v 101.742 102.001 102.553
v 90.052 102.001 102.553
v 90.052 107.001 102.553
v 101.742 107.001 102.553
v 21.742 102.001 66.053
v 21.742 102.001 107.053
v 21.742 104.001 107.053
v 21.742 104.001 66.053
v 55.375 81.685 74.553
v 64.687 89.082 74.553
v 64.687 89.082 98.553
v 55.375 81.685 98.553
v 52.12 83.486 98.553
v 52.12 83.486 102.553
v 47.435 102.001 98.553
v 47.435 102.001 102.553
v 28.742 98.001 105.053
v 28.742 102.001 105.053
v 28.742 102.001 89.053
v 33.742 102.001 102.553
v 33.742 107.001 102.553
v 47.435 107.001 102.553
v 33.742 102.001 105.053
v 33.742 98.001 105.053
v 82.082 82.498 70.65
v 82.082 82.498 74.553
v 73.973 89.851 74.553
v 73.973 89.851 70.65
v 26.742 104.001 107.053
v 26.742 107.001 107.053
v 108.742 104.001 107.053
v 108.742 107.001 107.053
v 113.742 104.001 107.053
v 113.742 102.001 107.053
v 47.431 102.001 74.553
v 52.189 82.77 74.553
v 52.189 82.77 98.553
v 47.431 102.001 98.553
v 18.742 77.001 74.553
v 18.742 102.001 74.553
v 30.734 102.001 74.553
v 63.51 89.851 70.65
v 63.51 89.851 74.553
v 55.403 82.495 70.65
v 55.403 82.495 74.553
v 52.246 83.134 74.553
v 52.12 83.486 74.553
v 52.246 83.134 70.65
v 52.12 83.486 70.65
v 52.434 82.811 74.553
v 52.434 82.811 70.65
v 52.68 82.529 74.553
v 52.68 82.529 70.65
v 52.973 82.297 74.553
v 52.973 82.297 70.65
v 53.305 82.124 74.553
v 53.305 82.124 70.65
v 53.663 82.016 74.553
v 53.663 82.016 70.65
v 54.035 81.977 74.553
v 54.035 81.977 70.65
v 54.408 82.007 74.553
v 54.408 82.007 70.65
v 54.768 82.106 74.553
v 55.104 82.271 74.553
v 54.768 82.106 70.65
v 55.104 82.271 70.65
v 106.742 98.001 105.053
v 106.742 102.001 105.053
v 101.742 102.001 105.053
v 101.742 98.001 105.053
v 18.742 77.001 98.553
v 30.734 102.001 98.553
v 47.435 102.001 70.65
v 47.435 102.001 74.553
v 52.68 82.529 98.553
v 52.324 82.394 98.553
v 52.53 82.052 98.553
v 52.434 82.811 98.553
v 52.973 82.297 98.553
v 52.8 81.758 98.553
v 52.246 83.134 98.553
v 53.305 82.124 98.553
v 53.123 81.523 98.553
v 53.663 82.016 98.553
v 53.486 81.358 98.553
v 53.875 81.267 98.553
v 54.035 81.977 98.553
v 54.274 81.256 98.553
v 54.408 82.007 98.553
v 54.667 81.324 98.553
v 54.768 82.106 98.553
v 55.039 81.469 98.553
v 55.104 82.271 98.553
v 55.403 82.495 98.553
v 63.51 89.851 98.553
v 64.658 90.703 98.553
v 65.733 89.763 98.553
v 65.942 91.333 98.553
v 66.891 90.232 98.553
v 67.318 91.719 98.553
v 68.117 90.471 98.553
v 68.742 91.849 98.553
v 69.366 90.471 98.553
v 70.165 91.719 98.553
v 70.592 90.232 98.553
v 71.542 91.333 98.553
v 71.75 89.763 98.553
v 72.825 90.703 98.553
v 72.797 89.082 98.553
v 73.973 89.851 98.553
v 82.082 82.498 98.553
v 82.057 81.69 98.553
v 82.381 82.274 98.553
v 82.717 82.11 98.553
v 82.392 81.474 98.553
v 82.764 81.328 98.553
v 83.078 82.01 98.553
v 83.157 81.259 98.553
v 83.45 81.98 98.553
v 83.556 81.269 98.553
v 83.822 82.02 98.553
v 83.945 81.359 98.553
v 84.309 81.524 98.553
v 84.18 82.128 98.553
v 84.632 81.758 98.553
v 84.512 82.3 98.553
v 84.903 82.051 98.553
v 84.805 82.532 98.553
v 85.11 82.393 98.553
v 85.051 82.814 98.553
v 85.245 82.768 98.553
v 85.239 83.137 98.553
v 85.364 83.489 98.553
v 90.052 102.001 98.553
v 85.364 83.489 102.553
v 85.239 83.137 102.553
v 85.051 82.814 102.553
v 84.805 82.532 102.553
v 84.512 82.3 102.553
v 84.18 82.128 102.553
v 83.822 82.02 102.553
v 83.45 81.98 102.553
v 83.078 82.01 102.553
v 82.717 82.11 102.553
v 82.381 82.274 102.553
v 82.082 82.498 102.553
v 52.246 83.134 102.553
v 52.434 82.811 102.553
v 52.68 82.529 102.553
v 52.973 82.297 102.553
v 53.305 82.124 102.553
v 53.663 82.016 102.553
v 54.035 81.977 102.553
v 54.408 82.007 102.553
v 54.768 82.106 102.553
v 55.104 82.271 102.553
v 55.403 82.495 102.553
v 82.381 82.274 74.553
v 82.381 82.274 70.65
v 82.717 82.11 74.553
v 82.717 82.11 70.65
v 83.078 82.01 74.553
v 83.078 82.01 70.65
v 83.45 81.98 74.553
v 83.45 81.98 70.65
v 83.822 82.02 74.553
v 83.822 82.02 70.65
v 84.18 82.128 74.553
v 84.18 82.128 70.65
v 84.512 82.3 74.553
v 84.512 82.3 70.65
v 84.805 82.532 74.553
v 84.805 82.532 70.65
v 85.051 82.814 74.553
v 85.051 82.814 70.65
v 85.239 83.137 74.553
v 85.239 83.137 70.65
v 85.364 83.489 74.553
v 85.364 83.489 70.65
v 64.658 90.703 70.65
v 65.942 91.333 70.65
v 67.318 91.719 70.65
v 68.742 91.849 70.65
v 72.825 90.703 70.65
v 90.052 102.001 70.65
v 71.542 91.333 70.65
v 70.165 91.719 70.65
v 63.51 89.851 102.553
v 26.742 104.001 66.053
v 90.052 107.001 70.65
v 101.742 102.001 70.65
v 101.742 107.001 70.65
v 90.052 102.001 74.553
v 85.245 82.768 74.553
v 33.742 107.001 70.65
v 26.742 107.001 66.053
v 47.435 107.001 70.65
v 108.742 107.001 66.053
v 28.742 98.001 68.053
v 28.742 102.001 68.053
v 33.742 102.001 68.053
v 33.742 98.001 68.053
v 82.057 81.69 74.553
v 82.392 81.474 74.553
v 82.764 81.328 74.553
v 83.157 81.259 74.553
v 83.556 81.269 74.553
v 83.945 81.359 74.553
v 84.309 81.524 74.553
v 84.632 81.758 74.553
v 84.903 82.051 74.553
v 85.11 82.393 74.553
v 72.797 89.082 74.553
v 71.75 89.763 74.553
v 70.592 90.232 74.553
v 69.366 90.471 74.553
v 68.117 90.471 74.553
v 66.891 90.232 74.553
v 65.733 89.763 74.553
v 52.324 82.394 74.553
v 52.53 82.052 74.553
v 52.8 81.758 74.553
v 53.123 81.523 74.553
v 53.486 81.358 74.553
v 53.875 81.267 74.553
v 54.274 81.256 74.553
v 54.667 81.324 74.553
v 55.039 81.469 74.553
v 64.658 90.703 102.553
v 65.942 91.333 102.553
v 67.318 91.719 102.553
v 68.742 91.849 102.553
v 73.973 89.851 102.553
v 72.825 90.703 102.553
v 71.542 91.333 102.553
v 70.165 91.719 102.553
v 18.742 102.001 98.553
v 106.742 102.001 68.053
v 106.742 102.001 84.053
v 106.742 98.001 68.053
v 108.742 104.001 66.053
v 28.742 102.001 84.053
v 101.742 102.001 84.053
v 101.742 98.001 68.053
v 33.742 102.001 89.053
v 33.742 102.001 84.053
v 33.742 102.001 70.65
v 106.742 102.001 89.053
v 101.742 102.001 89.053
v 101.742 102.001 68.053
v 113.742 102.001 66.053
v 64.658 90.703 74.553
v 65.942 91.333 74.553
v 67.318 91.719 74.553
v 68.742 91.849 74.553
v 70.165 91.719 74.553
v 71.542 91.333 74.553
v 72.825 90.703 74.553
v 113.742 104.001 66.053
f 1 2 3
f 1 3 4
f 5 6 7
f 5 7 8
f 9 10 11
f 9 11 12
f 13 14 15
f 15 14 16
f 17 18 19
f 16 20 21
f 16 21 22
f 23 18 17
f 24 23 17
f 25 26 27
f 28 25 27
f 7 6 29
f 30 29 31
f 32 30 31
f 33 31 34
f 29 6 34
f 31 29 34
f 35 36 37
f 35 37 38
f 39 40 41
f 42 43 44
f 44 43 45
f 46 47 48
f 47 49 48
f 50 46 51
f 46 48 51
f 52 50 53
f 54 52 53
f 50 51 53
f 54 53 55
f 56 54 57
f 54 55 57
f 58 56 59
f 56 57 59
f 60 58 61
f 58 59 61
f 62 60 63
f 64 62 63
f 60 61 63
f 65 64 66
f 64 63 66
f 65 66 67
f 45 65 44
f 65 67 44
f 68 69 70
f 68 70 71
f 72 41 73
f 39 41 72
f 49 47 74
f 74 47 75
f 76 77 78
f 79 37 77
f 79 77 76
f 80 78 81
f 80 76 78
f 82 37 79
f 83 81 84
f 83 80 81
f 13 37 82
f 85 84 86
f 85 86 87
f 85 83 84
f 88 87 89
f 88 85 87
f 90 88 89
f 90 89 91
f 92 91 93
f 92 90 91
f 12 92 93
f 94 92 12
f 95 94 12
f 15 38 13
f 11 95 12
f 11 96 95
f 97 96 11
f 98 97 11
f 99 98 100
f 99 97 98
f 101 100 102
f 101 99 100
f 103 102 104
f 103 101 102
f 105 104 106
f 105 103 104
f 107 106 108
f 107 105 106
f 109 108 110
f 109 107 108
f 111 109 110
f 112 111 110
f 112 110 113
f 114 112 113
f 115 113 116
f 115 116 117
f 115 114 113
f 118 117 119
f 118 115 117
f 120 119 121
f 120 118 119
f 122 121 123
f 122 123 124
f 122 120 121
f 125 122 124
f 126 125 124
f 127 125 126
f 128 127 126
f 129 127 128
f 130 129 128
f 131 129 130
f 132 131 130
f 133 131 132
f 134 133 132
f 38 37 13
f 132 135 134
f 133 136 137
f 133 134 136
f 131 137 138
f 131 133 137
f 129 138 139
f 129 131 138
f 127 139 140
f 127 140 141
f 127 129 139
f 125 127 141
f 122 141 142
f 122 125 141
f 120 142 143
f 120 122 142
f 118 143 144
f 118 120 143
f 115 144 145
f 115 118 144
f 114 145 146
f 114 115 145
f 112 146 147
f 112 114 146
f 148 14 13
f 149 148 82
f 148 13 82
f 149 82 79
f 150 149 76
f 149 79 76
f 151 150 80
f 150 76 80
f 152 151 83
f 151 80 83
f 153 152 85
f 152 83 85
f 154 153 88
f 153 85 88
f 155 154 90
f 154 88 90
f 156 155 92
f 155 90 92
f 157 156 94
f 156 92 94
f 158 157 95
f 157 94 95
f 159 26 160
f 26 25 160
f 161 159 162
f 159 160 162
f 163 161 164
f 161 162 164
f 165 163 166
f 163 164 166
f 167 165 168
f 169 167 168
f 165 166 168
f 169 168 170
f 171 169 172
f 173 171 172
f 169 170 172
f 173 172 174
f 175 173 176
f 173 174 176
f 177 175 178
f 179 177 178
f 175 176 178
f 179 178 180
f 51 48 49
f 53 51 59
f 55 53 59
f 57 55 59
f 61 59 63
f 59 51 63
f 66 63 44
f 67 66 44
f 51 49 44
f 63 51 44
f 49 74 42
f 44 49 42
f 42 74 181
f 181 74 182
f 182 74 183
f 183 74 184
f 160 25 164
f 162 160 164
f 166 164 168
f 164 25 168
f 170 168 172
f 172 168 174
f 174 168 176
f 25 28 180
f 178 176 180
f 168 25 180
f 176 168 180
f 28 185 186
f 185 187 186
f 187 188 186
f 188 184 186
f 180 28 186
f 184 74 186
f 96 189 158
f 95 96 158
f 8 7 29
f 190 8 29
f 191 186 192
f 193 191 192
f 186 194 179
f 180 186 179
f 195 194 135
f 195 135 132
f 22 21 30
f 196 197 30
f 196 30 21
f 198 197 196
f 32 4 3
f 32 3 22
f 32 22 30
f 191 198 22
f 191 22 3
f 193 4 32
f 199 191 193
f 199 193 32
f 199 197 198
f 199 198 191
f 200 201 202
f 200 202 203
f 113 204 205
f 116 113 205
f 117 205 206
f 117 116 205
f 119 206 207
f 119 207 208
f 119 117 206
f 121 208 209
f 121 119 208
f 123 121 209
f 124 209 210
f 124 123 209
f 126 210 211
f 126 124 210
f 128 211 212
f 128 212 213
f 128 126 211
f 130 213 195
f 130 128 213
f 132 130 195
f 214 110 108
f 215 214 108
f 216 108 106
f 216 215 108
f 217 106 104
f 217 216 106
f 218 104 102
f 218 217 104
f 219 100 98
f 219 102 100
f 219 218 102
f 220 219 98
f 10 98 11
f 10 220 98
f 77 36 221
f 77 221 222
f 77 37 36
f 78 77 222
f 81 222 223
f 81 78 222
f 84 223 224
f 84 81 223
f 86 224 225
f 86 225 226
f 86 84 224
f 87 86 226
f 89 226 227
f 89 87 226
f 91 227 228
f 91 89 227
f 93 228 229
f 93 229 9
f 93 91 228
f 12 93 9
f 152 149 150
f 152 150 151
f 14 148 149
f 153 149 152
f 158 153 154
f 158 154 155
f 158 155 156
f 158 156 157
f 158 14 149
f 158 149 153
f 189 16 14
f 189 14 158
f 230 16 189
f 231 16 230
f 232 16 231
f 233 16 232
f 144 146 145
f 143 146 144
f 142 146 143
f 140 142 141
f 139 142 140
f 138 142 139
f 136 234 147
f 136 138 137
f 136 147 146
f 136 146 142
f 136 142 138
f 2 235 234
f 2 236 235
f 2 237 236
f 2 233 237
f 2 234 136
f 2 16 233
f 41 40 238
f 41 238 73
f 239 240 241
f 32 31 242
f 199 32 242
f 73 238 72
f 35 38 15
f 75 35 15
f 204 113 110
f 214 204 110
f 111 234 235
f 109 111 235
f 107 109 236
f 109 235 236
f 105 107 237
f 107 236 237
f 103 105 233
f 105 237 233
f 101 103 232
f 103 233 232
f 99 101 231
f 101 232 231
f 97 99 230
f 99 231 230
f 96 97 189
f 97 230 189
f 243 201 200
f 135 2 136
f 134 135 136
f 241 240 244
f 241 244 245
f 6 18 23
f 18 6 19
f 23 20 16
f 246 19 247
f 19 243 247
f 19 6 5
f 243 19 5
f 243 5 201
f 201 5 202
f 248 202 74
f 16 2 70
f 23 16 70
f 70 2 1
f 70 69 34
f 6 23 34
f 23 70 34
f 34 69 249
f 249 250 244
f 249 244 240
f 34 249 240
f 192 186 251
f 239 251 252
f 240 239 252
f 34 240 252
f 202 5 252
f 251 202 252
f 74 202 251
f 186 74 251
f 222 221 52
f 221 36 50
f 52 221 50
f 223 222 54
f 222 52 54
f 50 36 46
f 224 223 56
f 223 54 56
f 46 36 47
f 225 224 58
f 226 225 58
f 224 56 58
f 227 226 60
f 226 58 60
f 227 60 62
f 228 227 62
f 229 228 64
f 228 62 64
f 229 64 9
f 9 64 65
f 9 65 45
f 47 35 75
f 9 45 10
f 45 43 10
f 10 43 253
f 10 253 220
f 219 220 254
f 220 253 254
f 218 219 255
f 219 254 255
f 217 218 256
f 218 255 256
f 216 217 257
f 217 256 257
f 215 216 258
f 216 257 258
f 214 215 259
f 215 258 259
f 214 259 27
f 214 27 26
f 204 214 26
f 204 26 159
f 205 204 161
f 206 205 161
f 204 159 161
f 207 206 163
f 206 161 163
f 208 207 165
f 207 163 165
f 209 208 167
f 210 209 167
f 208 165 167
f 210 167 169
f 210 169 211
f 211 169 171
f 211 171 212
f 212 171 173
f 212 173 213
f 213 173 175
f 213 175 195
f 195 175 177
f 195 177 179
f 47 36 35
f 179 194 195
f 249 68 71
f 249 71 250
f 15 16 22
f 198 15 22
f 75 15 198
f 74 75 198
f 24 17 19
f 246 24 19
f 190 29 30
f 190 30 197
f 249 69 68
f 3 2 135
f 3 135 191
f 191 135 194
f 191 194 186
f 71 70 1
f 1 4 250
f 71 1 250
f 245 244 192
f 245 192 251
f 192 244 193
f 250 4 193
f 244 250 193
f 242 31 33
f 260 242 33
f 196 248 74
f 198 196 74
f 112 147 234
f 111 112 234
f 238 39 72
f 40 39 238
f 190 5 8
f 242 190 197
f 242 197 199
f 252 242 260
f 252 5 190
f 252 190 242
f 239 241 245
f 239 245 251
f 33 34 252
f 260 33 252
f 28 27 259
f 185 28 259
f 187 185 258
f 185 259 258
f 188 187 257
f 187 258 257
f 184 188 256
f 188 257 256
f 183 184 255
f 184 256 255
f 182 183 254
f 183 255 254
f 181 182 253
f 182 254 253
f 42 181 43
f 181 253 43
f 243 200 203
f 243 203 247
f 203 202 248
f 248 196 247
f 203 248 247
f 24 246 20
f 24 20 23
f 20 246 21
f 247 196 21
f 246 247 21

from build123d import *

# Parameters (mm, degrees)
SKETCH_1_W                = 95.051874556
SKETCH_1_H                = 3.903181728
EXTRUDE_1_DEPTH           = 25
SKETCH_1_H_2              = 4
EXTRUDE_1_2_DEPTH         = 25
CUT_EXTRUDE_15_DEPTH      = 32
EXTRUDE_START             = 74.552702475
EXTRUDE_5_OUTLINE_W       = 95.051874556
EXTRUDE_5_OUTLINE_H       = 25
EXTRUDE_5_DEPTH           = 24
CUT_EXTRUDE_16_DEPTH      = 158.81601617
CUT_EXTRUDE_16_DEPTH_BACK = 158.81601617
SKETCH_3_R                = 6.5
FILLET_2_R                = 2
FILLET_3_R                = 2
EXTRUDE_6_DEPTH           = 5
EXTRUDE_6_2_DEPTH         = 5
EXTRUDE_7_DEPTH           = 5
EXTRUDE_7_2_DEPTH         = 5
SKETCH_6_W                = 82
SKETCH_6_H                = 41
SKETCH_6_W_2              = 13.693142479
SKETCH_6_H_2              = 31.903181728
SKETCH_6_W_3              = 11.689861707
EXTRUDE_8_DEPTH           = 5
SKETCH_7_W                = 5
SKETCH_7_H                = 41
EXTRUDE_9_DEPTH           = 2
CUT_EXTRUDE_START         = 74.552702475
CUT_EXTRUDE_17_DEPTH      = 24


# Read off the part's stored shape, not the designer's step: Бобышка-Вытянуть5, Вырез-Вытянуть17
with BuildPart() as part:
    # Эскиз1 → Бобышка-Вытянуть1 (new body)
    with BuildSketch(Plane(origin=(0, 102.001425994, 0), x_dir=(1, 0, 0), z_dir=(0, 1, 0))):
        with Locations((66.267706326, -72.601111611)):
            Rectangle(SKETCH_1_W, SKETCH_1_H)
    extrude(amount=-EXTRUDE_1_DEPTH)


with BuildPart() as body_2:
    # Эскиз1 → Extrude 1 2 (new body)
    with BuildSketch(Plane(origin=(0, 102.001425994, 0), x_dir=(1, 0, 0), z_dir=(0, 1, 0))):
        with Locations((66.267706326, -100.552702475)):
            Rectangle(SKETCH_1_W, SKETCH_1_H_2)
    extrude(amount=-EXTRUDE_1_2_DEPTH)


with BuildPart() as cut_extrude_15_tool:
    # Эскиз2 → Вырез-Вытянуть15 (new body)
    with BuildSketch(Plane.XY.offset(102.552702475)):
        with BuildLine():
            Line((63.510266919, 89.850934142), (52.937126115, 80.258094246))
            Line((52.937126115, 80.258094246), (47.434911527, 102.001425994))
            Line((47.434911527, 102.001425994), (18.741769048, 102.001425994))
            Line((18.741769048, 102.001425994), (18.741769048, 77.001425994))
            Line((18.741769048, 77.001425994), (113.793643604, 77.001425994))
            Line((113.793643604, 77.001425994), (113.793643604, 102.001425994))
            Line((113.793643604, 102.001425994), (90.051907341, 102.001425994))
            Line((90.051907341, 102.001425994), (84.547557962, 80.262935973))
            Line((84.547557962, 80.262935973), (73.973273177, 89.850934142))
            ThreePointArc((73.973273177, 89.850934142), (68.741770048, 91.84906096), (63.510266919, 89.850934142))
        make_face()
    extrude(amount=-CUT_EXTRUDE_15_DEPTH)


with BuildPart() as part_1:
    add(part.part)

    # Вырез-Вытянуть15: cut by cut_extrude_15_tool
    add(cut_extrude_15_tool.part, mode=Mode.SUBTRACT)



with BuildPart() as body_2_1:
    add(body_2.part)

    # Вырез-Вытянуть15: cut by cut_extrude_15_tool
    add(cut_extrude_15_tool.part, mode=Mode.SUBTRACT)


with BuildPart() as part_2:
    add(part_1.part)

    add(body_2_1.part)  # Бобышка-Вытянуть5 merges body 2
    # Бобышка-Вытянуть5 outline → Бобышка-Вытянуть5 (add)
    with BuildSketch(Plane.XY.offset(EXTRUDE_START)):
        with Locations((66.267706326, 89.501425994)):
            Rectangle(EXTRUDE_5_OUTLINE_W, EXTRUDE_5_OUTLINE_H)
    extrude(amount=EXTRUDE_5_DEPTH)

    # Эскиз3 → Вырез-Вытянуть16 (cut, two sides: drawn at the far end of the back side and taken through both)
    with BuildSketch(Plane.XY.offset(110.052702475).offset(-CUT_EXTRUDE_16_DEPTH_BACK)):
        with BuildLine():
            Line((52.937126115, 79.748220071), (47.431470764, 102.001425994))
            Line((47.431470764, 102.001425994), (30.73376132, 102.001425994))
            Line((30.73376132, 102.001425994), (18.741769048, 77.001425994))
            Line((18.741769048, 77.001425994), (88.549097609, 77.001425994))
            ThreePointArc((88.549097609, 77.001425994), (92.13390173, 85.931402357), (99.789402086, 80.101426994))
            ThreePointArc((99.789402086, 80.101426994), (99.571745411, 78.493558676), (98.934442488, 77.001425994))
            Line((98.934442488, 77.001425994), (113.793643604, 77.001425994))
            Line((113.793643604, 77.001425994), (113.793643604, 102.001425994))
            Line((113.793643604, 102.001425994), (90.051907341, 102.001425994))
            Line((90.051907341, 102.001425994), (84.489905965, 79.748220071))
            Line((84.489905965, 79.748220071), (72.796657252, 89.081573622))
            ThreePointArc((72.796657252, 89.081573622), (74.598679081, 86.82040138), (75.241770048, 84.001426994))
            ThreePointArc((75.241770048, 84.001426994), (65.922795662, 78.144517962), (64.686882844, 89.081573622))
            Line((64.686882844, 89.081573622), (52.937126115, 79.748220071))
        make_face()
        with Locations((68.741770048, 84.001426994)):
            Circle(SKETCH_3_R)
    extrude(amount=CUT_EXTRUDE_16_DEPTH + CUT_EXTRUDE_16_DEPTH_BACK, mode=Mode.SUBTRACT)


with BuildPart() as cut_extrude_16_piece_1:
    # of the separate pieces the step leaves, piece 1, a body of its own (cut_extrude_16_pieces)
    add(part_2.part.solids().sort_by_distance((90.051907341, 102.001425994, 74.552702475))[0])

    # Скругление2
    fillet_2_edges = [cut_extrude_16_piece_1.edges().sort_by_distance(p)[0] for p in [
        (52.937126115, 80.258094246, 72.601111611),
        (84.547557962, 80.262935973, 72.601111611),
        (84.547557962, 80.262935973, 100.552702475),
        (52.937126115, 80.258094246, 100.552702475),
    ]]
    fillet(fillet_2_edges, radius=FILLET_2_R)

    # Скругление3
    fillet_3_edges = [cut_extrude_16_piece_1.edges().sort_by_distance(p)[0] for p in [
        (52.937126115, 79.748220071, 86.552702475),
        (84.489905965, 79.748220071, 86.552702475),
    ]]
    fillet(fillet_3_edges, radius=FILLET_3_R)



with BuildPart() as cut_extrude_16_piece_2:
    # of the separate pieces the step leaves, piece 2, a body of its own (cut_extrude_16_pieces)
    add(part_2.part.solids().sort_by_distance((18.741769048, 102.001425994, 74.552702475))[0])


with BuildPart() as cut_extrude_16_piece_3:
    # of the separate pieces the step leaves, piece 3, a body of its own (cut_extrude_16_pieces)
    add(part_2.part.solids().sort_by_distance((88.549097609, 77.001425994, 74.552702475))[0])

    # Вырез-Вытянуть17 outline → Вырез-Вытянуть17 (cut)
    with BuildSketch(Plane.XY.offset(CUT_EXTRUDE_START)):
        with BuildLine():
            Line((88.549097609, 77.001425994), (98.934442488, 77.001425994))
            ThreePointArc((98.934442488, 77.001425994), (93.741770049, 86.149059032), (88.549097609, 77.001425994))
        make_face()
    extrude(amount=CUT_EXTRUDE_17_DEPTH, mode=Mode.SUBTRACT)


with BuildPart() as body_4:
    # Эскиз4 → Бобышка-Вытянуть6 (new body)
    with BuildSketch(Plane(origin=(28.741769048, 0, 0), x_dir=(0, 0, -1), z_dir=(1, 0, 0))):
        Polygon((-105.052702475, 102.001425994), (-105.052702475, 98.001425994), (-89.052702475, 102.001425994), align=None)
    extrude(amount=EXTRUDE_6_DEPTH)


with BuildPart() as body_5:
    # Эскиз4 → Extrude 6 2 (new body)
    with BuildSketch(Plane(origin=(28.741769048, 0, 0), x_dir=(0, 0, -1), z_dir=(1, 0, 0))):
        Polygon((-68.052702475, 102.001425994), (-68.052702475, 98.001425994), (-84.052702475, 102.001425994), align=None)
    extrude(amount=EXTRUDE_6_2_DEPTH)


with BuildPart() as body_6:
    # Эскиз5 → Бобышка-Вытянуть7 (new body)
    with BuildSketch(Plane.ZY.offset(-106.741769048)):
        Polygon((105.052702475, 102.001425994), (105.052702475, 98.001425994), (89.052702475, 102.001425994), align=None)
    extrude(amount=EXTRUDE_7_DEPTH)


with BuildPart() as body_7:
    # Эскиз5 → Extrude 7 2 (new body)
    with BuildSketch(Plane.ZY.offset(-106.741769048)):
        Polygon((68.052702475, 102.001425994), (84.052702475, 102.001425994), (68.052702475, 98.001425994), align=None)
    extrude(amount=EXTRUDE_7_2_DEPTH)


with BuildPart() as cut_extrude_16_piece_1_1:
    add(cut_extrude_16_piece_1.part)

    add(body_4.part)  # Бобышка-Вытянуть8 merges body 4

    add(body_5.part)  # Бобышка-Вытянуть8 merges body 5

    add(body_6.part)  # Бобышка-Вытянуть8 merges body 6

    add(body_7.part)  # Бобышка-Вытянуть8 merges body 7
    # Эскиз6 → Бобышка-Вытянуть8 (add)
    with BuildSketch(Plane(origin=(0, 102.001425994, 0), x_dir=(1, 0, 0), z_dir=(0, 1, 0))):
        with Locations((67.741769048, -86.552702475)):
            Rectangle(SKETCH_6_W, SKETCH_6_H)
        with Locations((40.588340288, -86.601111611)):
            Rectangle(SKETCH_6_W_2, SKETCH_6_H_2, mode=Mode.SUBTRACT)
        with Locations((95.896838195, -86.601111611)):
            Rectangle(SKETCH_6_W_3, SKETCH_6_H_2, mode=Mode.SUBTRACT)
    extrude(amount=EXTRUDE_8_DEPTH)

    # Эскиз7 → Бобышка-Вытянуть9 (add)
    with BuildSketch(Plane(origin=(0, 102.001425994, 0), x_dir=(1, 0, 0), z_dir=(0, 1, 0))):
        with Locations((24.241769048, -86.552702475)):
            Rectangle(SKETCH_7_W, SKETCH_7_H)
        with Locations((111.241769048, -86.552702475)):
            Rectangle(SKETCH_7_W, SKETCH_7_H)
    extrude(amount=EXTRUDE_9_DEPTH)


solid = Compound([cut_extrude_16_piece_2.part, cut_extrude_16_piece_1_1.part])
